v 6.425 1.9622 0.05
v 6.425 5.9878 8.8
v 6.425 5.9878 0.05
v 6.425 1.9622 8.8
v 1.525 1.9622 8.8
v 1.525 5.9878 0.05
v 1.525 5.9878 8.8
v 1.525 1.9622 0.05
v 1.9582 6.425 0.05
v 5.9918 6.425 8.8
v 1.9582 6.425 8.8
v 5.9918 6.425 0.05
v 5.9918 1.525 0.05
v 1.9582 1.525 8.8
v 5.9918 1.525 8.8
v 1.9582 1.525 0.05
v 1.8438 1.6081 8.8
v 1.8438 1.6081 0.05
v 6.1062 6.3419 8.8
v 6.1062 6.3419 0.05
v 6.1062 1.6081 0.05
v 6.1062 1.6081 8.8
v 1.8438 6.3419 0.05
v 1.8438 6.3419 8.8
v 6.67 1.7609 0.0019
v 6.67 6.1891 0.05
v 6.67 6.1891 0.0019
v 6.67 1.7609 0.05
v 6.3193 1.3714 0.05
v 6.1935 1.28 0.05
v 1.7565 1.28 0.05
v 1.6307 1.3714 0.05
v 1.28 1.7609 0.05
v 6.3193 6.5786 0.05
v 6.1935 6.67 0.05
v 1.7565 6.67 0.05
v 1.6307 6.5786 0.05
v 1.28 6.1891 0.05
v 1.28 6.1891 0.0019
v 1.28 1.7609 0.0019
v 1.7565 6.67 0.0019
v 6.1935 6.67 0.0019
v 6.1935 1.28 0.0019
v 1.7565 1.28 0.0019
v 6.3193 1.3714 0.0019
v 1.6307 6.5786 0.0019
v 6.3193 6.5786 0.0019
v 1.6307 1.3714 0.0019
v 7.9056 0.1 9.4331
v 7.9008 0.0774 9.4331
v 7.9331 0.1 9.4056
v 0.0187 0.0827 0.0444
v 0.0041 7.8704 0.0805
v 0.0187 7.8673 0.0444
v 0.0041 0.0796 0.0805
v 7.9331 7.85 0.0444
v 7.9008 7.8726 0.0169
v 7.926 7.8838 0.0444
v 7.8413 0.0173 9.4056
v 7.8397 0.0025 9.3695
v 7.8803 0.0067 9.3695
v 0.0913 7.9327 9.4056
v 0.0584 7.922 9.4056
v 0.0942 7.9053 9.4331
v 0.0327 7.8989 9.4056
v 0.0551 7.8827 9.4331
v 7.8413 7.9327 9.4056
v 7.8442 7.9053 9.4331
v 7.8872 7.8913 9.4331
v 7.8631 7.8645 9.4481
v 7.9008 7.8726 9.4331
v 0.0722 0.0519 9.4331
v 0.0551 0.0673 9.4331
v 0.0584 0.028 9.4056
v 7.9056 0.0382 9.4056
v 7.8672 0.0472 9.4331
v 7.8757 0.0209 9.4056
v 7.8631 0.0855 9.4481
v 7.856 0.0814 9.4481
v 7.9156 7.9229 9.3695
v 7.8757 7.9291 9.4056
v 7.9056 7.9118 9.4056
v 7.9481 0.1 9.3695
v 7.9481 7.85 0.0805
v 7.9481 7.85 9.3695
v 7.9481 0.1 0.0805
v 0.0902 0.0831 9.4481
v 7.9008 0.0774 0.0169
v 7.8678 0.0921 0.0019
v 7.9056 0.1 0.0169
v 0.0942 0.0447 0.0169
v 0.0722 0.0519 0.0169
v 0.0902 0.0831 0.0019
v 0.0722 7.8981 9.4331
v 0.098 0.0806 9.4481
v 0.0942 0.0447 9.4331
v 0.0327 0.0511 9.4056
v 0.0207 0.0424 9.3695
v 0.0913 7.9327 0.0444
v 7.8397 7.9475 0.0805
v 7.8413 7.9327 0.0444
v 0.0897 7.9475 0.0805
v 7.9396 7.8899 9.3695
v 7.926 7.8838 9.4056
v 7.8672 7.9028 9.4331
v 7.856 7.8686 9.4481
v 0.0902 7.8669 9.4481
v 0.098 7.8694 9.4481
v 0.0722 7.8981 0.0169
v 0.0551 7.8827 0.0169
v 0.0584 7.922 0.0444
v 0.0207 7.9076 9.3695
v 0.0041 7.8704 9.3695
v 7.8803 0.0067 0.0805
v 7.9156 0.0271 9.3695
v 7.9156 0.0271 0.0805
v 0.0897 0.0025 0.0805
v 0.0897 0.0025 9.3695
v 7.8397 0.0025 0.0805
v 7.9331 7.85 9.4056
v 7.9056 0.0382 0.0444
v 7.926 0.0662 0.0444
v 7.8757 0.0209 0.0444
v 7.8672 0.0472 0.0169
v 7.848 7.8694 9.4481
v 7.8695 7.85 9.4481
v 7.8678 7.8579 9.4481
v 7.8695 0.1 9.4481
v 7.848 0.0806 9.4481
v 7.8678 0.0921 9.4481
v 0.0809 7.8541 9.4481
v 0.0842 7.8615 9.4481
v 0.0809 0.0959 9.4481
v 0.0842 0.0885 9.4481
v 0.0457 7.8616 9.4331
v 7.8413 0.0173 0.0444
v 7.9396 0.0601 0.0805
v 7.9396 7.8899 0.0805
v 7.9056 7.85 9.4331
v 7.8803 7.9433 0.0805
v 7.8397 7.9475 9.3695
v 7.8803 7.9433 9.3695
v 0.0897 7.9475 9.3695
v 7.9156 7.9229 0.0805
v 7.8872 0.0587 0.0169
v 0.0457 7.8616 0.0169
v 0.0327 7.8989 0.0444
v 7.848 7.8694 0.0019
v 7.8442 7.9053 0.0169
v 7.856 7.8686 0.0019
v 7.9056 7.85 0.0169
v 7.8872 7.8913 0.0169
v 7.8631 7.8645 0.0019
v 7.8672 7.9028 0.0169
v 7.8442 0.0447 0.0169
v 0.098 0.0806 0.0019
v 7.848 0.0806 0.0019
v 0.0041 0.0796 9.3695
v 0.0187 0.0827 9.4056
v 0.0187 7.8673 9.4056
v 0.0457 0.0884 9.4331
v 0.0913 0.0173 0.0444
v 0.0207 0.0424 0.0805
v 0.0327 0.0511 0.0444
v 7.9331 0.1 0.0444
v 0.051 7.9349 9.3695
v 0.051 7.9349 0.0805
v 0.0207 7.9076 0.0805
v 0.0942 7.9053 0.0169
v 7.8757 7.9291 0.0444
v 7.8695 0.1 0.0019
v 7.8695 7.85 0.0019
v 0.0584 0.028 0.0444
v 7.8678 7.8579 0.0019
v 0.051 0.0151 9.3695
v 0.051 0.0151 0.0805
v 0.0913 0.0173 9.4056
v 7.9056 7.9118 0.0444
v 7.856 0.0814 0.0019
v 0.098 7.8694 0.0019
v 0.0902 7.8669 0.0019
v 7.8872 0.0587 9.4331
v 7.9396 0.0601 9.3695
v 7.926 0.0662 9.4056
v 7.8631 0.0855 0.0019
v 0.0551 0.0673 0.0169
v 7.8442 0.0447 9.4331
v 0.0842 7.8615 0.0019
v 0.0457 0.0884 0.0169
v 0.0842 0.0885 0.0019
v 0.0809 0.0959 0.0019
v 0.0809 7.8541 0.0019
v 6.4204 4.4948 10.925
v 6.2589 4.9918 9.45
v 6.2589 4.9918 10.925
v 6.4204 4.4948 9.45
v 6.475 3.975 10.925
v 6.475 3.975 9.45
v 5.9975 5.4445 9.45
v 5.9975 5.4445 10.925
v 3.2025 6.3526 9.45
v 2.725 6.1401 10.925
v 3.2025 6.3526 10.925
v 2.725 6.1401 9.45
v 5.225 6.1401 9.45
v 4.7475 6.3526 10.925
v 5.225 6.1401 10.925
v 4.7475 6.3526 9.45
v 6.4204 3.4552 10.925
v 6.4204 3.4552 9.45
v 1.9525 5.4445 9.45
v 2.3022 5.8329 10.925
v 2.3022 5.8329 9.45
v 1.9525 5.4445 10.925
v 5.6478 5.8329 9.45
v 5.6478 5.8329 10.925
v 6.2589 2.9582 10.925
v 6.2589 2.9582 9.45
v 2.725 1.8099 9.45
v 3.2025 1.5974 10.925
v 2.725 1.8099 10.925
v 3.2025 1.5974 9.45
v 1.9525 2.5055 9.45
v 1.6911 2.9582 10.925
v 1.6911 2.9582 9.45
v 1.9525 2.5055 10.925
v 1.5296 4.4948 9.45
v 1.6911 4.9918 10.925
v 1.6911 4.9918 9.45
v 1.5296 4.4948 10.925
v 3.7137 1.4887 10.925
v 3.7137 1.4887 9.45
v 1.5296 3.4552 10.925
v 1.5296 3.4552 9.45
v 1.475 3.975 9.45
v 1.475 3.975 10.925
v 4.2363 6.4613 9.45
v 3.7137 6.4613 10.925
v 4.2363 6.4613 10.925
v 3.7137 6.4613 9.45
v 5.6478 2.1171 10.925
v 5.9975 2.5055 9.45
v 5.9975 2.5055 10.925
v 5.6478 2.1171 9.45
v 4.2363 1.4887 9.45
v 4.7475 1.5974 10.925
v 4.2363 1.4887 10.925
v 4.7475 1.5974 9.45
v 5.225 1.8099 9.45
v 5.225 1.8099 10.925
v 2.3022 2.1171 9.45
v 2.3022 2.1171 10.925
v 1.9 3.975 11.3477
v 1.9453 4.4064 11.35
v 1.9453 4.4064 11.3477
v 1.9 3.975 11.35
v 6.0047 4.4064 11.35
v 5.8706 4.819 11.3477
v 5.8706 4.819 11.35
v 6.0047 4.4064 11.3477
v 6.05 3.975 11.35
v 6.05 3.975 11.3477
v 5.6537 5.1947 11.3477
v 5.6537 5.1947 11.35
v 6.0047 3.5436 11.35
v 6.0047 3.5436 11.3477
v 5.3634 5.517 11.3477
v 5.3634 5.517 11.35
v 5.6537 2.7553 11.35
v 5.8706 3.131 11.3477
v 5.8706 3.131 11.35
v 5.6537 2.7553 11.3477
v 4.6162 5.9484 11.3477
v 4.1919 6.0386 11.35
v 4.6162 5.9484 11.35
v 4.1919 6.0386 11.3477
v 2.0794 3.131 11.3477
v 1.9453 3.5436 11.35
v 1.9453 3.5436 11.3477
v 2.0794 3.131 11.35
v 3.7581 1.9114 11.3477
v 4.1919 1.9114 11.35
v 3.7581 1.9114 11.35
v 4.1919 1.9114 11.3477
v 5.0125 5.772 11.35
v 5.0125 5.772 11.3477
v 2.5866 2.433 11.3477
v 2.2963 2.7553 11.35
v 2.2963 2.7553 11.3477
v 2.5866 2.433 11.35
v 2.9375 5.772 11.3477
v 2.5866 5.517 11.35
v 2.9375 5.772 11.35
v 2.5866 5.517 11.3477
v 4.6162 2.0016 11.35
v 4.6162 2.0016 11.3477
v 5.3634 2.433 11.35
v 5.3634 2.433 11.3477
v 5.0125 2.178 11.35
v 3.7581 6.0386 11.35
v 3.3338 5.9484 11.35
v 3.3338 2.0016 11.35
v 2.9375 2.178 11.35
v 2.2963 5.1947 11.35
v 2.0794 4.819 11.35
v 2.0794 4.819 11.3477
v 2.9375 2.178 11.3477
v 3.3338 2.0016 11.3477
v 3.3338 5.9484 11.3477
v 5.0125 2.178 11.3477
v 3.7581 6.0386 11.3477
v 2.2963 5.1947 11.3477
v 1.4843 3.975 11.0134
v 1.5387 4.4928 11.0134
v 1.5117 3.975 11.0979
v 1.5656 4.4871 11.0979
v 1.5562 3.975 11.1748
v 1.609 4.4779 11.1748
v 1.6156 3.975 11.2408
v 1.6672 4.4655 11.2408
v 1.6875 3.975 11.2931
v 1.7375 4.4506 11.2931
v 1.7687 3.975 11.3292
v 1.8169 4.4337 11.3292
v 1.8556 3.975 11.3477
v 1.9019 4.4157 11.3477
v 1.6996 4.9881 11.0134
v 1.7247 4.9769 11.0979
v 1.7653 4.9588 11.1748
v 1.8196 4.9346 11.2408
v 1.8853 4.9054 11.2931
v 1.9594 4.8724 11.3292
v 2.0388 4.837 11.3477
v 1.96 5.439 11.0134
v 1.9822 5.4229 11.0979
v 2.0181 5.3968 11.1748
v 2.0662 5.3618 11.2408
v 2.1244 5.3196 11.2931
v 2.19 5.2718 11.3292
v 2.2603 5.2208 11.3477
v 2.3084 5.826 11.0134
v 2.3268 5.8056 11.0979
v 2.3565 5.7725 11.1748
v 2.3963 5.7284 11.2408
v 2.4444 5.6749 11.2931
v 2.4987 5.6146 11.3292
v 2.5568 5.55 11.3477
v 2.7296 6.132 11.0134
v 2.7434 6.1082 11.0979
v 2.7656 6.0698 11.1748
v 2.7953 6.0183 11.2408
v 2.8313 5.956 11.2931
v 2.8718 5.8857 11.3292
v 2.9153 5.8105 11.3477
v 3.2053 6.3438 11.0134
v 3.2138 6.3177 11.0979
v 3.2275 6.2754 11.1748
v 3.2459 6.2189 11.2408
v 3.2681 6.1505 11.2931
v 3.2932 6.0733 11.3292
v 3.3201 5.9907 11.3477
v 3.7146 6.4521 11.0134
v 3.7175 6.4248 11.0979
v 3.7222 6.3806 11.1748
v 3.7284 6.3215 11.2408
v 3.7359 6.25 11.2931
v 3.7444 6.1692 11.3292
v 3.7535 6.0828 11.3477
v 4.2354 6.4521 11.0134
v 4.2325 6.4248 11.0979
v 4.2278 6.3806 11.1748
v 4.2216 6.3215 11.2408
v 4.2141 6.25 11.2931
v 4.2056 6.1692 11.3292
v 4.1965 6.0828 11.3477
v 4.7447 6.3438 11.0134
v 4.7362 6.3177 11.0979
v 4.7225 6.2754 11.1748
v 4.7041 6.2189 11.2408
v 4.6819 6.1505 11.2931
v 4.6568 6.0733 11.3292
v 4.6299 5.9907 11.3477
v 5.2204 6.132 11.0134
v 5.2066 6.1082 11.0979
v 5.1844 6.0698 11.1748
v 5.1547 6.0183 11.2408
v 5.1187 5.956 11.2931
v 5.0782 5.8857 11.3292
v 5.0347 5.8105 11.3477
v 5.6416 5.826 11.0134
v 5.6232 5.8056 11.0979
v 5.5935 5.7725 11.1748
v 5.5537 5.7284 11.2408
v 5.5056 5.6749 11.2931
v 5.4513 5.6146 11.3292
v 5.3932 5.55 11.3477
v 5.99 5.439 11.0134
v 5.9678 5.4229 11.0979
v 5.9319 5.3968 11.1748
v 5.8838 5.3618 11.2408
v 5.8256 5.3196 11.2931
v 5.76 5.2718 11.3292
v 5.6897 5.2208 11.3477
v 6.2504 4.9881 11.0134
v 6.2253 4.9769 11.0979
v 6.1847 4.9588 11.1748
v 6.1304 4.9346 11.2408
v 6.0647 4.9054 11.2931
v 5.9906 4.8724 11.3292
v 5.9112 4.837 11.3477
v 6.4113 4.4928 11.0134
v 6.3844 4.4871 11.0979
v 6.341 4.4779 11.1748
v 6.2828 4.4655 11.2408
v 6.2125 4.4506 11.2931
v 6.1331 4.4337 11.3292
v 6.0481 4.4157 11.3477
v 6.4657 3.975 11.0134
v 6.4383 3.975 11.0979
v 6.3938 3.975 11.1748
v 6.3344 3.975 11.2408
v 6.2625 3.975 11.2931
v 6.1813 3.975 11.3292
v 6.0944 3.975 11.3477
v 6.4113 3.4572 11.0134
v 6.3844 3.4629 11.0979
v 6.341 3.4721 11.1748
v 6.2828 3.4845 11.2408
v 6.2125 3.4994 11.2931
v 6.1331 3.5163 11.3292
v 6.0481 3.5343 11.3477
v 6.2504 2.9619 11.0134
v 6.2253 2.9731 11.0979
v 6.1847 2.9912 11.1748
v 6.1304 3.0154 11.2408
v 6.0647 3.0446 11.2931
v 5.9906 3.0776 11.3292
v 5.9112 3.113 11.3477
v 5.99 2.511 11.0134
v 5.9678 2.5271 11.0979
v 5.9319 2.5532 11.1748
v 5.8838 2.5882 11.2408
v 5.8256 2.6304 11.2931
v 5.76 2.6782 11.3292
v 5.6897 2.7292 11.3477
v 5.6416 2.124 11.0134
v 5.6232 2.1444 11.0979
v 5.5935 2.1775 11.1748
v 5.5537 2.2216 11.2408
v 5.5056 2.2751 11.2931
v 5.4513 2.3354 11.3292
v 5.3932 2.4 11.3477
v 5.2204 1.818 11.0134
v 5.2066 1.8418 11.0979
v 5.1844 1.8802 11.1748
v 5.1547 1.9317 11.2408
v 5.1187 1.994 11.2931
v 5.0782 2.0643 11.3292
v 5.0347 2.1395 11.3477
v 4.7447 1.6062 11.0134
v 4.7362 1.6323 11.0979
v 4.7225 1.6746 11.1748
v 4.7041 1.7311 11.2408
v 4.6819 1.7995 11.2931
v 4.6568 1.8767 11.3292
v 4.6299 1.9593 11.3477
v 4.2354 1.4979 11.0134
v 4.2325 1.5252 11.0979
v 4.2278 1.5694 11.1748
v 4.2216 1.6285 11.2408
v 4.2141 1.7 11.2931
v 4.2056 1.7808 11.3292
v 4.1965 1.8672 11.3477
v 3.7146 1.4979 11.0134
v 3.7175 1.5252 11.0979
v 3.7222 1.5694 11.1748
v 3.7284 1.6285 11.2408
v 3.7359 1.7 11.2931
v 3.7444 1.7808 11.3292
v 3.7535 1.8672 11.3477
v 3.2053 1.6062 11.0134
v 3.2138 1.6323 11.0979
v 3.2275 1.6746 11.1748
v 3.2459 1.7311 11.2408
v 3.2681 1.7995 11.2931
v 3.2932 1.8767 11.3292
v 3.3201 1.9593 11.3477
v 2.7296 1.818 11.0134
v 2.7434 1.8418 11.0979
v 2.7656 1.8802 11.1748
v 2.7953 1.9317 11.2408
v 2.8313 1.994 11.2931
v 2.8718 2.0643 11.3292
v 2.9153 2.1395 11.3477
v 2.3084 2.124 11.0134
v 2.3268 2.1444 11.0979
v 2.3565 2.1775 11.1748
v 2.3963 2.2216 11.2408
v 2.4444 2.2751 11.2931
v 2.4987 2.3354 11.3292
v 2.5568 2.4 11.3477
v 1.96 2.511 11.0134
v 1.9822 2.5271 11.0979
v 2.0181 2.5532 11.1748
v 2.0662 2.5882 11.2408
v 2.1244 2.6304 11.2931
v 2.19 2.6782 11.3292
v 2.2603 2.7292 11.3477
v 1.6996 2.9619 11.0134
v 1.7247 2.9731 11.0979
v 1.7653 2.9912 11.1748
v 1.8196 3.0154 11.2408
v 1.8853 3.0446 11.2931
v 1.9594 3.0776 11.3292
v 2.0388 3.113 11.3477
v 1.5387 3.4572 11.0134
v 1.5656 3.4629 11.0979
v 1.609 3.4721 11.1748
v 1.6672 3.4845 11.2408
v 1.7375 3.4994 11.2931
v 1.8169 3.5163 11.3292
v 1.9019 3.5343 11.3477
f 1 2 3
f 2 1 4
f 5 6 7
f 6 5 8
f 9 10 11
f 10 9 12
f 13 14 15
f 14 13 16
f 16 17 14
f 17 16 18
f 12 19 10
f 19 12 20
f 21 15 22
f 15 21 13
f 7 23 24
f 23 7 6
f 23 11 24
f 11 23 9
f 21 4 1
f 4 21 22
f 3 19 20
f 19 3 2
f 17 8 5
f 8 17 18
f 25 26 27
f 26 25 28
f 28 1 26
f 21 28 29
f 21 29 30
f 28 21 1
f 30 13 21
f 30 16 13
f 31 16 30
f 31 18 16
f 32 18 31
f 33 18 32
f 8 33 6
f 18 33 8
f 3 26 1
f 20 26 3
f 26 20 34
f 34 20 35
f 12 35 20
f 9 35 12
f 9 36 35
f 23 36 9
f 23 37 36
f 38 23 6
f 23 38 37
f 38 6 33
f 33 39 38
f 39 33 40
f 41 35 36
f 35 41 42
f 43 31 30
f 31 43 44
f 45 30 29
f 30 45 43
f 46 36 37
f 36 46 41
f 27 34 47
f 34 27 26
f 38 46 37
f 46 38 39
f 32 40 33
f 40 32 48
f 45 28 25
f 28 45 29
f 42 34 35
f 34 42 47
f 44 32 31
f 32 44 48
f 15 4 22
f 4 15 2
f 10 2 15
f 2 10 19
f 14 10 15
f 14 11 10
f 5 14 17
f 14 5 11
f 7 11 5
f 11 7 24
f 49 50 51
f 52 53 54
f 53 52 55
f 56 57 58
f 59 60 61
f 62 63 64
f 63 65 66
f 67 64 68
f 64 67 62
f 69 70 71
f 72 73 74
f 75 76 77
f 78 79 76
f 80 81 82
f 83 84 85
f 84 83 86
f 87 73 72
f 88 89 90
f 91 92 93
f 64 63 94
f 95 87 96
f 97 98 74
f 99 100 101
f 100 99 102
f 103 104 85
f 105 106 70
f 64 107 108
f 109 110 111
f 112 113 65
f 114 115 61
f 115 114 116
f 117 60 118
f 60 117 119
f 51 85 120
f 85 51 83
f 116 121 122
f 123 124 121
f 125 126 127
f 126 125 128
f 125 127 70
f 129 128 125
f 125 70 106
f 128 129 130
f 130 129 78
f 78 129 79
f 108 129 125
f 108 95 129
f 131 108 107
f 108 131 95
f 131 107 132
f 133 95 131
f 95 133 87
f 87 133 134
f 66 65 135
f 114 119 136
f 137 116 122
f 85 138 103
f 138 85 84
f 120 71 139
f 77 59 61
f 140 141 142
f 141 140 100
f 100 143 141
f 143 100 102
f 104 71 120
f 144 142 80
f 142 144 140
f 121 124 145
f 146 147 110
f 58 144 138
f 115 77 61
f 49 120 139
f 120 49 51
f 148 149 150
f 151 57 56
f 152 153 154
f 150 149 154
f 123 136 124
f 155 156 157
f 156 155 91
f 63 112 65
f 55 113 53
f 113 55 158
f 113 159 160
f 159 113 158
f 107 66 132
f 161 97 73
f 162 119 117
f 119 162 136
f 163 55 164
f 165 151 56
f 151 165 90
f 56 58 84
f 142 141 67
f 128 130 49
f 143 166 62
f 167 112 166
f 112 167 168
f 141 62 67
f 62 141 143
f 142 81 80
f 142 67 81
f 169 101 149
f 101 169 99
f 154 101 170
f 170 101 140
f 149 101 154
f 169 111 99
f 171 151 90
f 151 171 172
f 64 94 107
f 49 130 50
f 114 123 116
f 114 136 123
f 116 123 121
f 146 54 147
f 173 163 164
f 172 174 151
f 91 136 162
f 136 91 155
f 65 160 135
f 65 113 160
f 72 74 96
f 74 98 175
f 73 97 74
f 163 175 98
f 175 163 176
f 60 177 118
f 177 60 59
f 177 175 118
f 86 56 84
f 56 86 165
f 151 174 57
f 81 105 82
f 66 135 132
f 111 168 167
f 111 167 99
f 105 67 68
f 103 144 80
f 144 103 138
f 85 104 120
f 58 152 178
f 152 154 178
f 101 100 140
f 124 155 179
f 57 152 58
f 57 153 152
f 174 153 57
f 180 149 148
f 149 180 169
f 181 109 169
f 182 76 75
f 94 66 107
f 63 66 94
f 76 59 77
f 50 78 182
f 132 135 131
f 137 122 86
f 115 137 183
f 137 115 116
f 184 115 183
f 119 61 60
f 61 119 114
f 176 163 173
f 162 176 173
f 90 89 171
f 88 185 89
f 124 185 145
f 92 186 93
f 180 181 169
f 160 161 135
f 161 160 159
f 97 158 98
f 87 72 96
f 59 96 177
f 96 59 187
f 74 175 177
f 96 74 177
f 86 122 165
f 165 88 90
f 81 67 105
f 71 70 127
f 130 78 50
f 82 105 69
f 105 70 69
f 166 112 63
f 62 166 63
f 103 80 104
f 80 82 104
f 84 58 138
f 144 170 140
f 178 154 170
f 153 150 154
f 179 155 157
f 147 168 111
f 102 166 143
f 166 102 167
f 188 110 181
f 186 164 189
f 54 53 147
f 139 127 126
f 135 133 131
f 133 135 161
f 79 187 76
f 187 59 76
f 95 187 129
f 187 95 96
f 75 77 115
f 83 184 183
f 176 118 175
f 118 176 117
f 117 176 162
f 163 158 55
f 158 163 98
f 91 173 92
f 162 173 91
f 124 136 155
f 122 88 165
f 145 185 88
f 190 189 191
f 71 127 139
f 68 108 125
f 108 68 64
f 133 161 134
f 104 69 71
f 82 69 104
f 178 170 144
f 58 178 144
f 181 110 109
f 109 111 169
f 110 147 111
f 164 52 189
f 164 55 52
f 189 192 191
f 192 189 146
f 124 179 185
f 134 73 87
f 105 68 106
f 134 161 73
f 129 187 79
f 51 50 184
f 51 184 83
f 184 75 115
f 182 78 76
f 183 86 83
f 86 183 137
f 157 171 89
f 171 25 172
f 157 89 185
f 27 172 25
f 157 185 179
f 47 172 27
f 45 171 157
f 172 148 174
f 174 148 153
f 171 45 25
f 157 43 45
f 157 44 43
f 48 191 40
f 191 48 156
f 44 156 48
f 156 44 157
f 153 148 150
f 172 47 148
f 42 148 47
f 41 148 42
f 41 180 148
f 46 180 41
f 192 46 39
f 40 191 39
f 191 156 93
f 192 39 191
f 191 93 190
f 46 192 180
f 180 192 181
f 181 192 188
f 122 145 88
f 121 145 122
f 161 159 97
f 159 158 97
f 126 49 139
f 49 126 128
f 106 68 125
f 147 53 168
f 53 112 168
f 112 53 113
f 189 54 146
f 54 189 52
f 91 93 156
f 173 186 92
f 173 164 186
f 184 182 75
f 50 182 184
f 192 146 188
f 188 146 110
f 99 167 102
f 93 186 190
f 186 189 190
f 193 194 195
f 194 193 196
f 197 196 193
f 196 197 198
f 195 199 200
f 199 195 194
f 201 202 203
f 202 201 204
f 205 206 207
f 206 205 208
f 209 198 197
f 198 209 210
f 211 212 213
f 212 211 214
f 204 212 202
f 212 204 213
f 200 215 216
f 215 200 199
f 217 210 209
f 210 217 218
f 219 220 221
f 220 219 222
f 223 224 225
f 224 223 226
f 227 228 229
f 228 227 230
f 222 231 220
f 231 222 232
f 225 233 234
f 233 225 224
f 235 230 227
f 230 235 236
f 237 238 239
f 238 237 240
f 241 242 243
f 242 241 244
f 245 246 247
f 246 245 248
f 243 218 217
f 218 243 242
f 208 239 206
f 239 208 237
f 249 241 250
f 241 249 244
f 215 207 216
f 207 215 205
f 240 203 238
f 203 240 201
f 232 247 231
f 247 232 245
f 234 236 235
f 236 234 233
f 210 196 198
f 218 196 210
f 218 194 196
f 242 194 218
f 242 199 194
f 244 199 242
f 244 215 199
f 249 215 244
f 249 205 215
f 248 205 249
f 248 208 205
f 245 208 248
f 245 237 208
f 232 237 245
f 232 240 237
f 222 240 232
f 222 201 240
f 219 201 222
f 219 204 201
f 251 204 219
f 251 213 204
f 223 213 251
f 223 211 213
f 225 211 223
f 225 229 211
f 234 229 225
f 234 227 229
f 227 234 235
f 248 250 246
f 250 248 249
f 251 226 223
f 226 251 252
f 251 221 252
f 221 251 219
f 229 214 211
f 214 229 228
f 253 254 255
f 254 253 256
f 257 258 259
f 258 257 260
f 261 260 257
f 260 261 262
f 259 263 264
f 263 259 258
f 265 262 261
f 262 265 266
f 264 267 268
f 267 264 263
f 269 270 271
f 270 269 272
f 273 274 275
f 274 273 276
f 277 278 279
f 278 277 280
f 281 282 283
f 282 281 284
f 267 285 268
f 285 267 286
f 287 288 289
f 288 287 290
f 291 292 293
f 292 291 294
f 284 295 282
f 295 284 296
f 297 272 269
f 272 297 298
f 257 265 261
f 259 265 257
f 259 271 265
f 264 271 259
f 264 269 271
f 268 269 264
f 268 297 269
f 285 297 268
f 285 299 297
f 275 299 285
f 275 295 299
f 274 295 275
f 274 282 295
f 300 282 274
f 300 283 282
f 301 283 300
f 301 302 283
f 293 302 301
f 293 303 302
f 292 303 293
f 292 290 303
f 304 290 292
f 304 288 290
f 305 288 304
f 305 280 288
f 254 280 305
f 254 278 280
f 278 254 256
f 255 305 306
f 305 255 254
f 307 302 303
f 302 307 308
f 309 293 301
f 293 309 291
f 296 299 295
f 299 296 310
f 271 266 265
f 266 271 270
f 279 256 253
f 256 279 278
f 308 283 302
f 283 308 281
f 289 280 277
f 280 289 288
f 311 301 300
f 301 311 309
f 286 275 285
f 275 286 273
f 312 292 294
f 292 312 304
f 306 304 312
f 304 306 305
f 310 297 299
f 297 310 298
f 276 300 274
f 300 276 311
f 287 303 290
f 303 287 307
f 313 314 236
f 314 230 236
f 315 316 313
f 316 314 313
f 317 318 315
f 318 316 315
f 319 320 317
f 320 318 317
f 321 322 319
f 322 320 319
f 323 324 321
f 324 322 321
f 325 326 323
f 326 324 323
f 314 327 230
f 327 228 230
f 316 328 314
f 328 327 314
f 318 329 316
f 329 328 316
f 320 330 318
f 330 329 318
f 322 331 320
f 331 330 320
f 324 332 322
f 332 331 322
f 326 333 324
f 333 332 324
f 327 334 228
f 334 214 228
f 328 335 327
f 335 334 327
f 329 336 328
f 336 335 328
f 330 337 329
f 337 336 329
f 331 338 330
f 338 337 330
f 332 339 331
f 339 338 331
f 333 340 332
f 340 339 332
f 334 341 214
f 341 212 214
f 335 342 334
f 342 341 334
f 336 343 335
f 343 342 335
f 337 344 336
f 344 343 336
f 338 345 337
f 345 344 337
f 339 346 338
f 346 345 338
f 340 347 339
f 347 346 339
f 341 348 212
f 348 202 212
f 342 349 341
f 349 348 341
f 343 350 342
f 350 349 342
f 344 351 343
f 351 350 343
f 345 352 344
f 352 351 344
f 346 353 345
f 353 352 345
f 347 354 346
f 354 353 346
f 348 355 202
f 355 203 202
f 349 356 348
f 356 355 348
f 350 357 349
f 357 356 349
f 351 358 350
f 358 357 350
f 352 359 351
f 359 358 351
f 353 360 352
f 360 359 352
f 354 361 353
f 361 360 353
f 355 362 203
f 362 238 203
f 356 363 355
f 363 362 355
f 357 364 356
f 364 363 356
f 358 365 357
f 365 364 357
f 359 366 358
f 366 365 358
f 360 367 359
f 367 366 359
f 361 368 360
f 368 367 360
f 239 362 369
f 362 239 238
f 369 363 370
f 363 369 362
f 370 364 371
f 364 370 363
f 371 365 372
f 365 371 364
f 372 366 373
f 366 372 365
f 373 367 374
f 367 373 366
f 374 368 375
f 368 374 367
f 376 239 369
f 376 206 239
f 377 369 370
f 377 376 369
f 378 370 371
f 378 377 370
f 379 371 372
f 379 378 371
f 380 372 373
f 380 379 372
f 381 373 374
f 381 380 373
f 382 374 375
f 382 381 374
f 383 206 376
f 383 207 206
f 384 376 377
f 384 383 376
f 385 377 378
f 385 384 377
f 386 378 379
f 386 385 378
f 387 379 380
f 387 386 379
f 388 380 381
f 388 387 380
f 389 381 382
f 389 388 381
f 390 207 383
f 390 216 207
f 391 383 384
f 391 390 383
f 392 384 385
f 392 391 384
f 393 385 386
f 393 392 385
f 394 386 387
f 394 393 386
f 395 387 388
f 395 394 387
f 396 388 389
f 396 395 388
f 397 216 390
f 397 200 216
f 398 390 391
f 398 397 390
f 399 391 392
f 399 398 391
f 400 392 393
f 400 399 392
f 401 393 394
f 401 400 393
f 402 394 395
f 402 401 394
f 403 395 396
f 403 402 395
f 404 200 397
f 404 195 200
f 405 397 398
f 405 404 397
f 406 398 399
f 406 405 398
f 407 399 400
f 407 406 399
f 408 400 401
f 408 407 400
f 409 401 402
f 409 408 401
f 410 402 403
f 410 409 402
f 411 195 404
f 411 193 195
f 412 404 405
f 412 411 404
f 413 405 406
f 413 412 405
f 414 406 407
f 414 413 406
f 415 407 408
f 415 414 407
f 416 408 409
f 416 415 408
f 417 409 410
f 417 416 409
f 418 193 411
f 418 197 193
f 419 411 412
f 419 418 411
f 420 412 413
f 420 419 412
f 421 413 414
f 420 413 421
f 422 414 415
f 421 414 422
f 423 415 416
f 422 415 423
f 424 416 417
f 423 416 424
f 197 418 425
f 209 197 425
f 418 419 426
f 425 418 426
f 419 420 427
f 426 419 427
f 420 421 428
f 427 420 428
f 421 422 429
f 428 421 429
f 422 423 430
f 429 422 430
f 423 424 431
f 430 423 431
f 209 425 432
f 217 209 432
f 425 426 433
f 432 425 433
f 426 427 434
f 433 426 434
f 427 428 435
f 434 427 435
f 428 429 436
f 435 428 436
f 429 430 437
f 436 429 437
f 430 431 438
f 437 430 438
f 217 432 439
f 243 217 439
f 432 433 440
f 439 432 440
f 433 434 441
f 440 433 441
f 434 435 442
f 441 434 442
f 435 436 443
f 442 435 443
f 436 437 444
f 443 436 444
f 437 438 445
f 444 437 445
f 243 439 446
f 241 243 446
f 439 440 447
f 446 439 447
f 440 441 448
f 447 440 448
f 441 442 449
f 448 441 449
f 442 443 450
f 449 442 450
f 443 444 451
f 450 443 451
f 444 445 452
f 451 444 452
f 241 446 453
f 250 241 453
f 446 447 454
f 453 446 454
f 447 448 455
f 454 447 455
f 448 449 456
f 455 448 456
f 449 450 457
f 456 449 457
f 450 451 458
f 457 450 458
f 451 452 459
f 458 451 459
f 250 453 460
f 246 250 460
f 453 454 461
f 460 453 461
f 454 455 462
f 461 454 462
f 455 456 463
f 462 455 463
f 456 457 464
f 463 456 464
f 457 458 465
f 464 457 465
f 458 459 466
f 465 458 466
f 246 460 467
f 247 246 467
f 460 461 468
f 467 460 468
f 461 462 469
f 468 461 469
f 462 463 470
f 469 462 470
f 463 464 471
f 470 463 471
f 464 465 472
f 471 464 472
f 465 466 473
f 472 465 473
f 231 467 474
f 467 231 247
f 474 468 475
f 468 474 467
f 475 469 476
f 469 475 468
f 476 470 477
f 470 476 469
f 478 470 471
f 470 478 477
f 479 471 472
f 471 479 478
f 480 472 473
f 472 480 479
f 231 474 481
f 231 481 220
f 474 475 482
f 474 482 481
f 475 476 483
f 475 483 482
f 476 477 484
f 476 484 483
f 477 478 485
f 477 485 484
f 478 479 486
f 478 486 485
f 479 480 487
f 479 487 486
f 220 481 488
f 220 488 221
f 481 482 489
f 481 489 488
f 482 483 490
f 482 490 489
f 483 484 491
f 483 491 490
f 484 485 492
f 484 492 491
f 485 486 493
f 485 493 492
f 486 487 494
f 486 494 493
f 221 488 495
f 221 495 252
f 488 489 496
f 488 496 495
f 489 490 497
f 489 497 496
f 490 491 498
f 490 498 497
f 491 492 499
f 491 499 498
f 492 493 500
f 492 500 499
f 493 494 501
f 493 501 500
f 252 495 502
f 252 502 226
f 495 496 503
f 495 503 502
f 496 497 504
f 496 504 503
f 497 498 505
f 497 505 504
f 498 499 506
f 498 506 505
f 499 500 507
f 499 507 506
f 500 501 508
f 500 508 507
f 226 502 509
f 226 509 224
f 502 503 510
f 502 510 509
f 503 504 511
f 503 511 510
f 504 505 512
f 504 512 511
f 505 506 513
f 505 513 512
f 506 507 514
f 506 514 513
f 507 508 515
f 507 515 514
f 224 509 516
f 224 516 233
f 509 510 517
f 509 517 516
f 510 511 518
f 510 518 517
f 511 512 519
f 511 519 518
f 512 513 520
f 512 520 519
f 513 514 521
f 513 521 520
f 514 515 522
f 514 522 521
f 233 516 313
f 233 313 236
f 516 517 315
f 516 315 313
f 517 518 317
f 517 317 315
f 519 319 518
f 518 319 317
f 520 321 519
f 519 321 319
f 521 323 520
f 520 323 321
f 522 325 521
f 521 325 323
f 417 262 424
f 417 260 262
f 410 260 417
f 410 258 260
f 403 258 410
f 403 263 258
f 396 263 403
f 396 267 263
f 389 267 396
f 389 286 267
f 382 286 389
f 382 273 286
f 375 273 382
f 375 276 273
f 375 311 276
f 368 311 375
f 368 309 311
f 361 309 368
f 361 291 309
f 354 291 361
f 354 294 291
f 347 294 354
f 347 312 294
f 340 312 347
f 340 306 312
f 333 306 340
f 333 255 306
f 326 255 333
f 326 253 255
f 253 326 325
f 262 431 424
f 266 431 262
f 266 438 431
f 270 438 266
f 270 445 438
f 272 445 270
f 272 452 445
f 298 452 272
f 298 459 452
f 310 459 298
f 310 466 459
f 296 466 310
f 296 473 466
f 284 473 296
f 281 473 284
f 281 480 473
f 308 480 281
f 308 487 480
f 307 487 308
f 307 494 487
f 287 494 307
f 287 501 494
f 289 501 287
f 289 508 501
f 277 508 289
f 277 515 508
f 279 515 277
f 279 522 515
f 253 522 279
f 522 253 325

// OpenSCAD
// file: ../lib/roundedcube_simple.scad
module roundedcube_simple(size = [1, 1, 1], center = false, radius = 0.5, resolution = 20) {
	// If single value, convert to [x, y, z] vector
	size = (size[0] == undef) ? [size, size, size] : size;

	translate = (center == false) ?
		[radius, radius, radius] :
		[
			radius - (size[0] / 2),
			radius - (size[1] / 2),
			radius - (size[2] / 2)
	];

	translate(v = translate)
	minkowski() {
		cube(size = [
			size[0] - (radius * 2),
			size[1] - (radius * 2),
			size[2] - (radius * 2)
		]);
		sphere(r = radius, $fn = resolution);
	}
}
// file: ../lib/roundedcube.scad
// More information: https://danielupshaw.com/openscad-rounded-corners/

// Set to 0.01 for higher definition curves (renders slower)
$fs = 0.15;

module roundedcube(size = [1, 1, 1], center = false, radius = 0.5, apply_to = "all", resolution = 20) {
	// If single value, convert to [x, y, z] vector
	size = (size[0] == undef) ? [size, size, size] : size;

	translate_min = radius;
	translate_xmax = size[0] - radius;
	translate_ymax = size[1] - radius;
	translate_zmax = size[2] - radius;

	diameter = radius * 2;

	obj_translate = (center == false) ?
		[0, 0, 0] : [
			-(size[0] / 2),
			-(size[1] / 2),
			-(size[2] / 2)
		];

	translate(v = obj_translate) {
		hull() {
			for (translate_x = [translate_min, translate_xmax]) {
				x_at = (translate_x == translate_min) ? "min" : "max";
				for (translate_y = [translate_min, translate_ymax]) {
					y_at = (translate_y == translate_min) ? "min" : "max";
					for (translate_z = [translate_min, translate_zmax]) {
						z_at = (translate_z == translate_min) ? "min" : "max";

						translate(v = [translate_x, translate_y, translate_z])
						if (
							(apply_to == "all") ||
							(apply_to == "xmin" && x_at == "min") || (apply_to == "xmax" && x_at == "max") ||
							(apply_to == "ymin" && y_at == "min") || (apply_to == "ymax" && y_at == "max") ||
							(apply_to == "zmin" && z_at == "min") || (apply_to == "zmax" && z_at == "max")
						) {
							sphere(r = radius, $fn = resolution);
						} else {
							rotate = 
								(apply_to == "xmin" || apply_to == "xmax" || apply_to == "x") ? [0, 90, 0] : (
								(apply_to == "ymin" || apply_to == "ymax" || apply_to == "y") ? [90, 90, 0] :
								[0, 0, 0]
							);
							rotate(a = rotate)
							cylinder(h = diameter, r = radius, center = true, $fn = resolution);
						}
					}
				}
			}
		}
	}
}
// main file
echo(version=version());

include <../lib/block.scad>;

block(baseLayers=3, grid=[1,1]);
